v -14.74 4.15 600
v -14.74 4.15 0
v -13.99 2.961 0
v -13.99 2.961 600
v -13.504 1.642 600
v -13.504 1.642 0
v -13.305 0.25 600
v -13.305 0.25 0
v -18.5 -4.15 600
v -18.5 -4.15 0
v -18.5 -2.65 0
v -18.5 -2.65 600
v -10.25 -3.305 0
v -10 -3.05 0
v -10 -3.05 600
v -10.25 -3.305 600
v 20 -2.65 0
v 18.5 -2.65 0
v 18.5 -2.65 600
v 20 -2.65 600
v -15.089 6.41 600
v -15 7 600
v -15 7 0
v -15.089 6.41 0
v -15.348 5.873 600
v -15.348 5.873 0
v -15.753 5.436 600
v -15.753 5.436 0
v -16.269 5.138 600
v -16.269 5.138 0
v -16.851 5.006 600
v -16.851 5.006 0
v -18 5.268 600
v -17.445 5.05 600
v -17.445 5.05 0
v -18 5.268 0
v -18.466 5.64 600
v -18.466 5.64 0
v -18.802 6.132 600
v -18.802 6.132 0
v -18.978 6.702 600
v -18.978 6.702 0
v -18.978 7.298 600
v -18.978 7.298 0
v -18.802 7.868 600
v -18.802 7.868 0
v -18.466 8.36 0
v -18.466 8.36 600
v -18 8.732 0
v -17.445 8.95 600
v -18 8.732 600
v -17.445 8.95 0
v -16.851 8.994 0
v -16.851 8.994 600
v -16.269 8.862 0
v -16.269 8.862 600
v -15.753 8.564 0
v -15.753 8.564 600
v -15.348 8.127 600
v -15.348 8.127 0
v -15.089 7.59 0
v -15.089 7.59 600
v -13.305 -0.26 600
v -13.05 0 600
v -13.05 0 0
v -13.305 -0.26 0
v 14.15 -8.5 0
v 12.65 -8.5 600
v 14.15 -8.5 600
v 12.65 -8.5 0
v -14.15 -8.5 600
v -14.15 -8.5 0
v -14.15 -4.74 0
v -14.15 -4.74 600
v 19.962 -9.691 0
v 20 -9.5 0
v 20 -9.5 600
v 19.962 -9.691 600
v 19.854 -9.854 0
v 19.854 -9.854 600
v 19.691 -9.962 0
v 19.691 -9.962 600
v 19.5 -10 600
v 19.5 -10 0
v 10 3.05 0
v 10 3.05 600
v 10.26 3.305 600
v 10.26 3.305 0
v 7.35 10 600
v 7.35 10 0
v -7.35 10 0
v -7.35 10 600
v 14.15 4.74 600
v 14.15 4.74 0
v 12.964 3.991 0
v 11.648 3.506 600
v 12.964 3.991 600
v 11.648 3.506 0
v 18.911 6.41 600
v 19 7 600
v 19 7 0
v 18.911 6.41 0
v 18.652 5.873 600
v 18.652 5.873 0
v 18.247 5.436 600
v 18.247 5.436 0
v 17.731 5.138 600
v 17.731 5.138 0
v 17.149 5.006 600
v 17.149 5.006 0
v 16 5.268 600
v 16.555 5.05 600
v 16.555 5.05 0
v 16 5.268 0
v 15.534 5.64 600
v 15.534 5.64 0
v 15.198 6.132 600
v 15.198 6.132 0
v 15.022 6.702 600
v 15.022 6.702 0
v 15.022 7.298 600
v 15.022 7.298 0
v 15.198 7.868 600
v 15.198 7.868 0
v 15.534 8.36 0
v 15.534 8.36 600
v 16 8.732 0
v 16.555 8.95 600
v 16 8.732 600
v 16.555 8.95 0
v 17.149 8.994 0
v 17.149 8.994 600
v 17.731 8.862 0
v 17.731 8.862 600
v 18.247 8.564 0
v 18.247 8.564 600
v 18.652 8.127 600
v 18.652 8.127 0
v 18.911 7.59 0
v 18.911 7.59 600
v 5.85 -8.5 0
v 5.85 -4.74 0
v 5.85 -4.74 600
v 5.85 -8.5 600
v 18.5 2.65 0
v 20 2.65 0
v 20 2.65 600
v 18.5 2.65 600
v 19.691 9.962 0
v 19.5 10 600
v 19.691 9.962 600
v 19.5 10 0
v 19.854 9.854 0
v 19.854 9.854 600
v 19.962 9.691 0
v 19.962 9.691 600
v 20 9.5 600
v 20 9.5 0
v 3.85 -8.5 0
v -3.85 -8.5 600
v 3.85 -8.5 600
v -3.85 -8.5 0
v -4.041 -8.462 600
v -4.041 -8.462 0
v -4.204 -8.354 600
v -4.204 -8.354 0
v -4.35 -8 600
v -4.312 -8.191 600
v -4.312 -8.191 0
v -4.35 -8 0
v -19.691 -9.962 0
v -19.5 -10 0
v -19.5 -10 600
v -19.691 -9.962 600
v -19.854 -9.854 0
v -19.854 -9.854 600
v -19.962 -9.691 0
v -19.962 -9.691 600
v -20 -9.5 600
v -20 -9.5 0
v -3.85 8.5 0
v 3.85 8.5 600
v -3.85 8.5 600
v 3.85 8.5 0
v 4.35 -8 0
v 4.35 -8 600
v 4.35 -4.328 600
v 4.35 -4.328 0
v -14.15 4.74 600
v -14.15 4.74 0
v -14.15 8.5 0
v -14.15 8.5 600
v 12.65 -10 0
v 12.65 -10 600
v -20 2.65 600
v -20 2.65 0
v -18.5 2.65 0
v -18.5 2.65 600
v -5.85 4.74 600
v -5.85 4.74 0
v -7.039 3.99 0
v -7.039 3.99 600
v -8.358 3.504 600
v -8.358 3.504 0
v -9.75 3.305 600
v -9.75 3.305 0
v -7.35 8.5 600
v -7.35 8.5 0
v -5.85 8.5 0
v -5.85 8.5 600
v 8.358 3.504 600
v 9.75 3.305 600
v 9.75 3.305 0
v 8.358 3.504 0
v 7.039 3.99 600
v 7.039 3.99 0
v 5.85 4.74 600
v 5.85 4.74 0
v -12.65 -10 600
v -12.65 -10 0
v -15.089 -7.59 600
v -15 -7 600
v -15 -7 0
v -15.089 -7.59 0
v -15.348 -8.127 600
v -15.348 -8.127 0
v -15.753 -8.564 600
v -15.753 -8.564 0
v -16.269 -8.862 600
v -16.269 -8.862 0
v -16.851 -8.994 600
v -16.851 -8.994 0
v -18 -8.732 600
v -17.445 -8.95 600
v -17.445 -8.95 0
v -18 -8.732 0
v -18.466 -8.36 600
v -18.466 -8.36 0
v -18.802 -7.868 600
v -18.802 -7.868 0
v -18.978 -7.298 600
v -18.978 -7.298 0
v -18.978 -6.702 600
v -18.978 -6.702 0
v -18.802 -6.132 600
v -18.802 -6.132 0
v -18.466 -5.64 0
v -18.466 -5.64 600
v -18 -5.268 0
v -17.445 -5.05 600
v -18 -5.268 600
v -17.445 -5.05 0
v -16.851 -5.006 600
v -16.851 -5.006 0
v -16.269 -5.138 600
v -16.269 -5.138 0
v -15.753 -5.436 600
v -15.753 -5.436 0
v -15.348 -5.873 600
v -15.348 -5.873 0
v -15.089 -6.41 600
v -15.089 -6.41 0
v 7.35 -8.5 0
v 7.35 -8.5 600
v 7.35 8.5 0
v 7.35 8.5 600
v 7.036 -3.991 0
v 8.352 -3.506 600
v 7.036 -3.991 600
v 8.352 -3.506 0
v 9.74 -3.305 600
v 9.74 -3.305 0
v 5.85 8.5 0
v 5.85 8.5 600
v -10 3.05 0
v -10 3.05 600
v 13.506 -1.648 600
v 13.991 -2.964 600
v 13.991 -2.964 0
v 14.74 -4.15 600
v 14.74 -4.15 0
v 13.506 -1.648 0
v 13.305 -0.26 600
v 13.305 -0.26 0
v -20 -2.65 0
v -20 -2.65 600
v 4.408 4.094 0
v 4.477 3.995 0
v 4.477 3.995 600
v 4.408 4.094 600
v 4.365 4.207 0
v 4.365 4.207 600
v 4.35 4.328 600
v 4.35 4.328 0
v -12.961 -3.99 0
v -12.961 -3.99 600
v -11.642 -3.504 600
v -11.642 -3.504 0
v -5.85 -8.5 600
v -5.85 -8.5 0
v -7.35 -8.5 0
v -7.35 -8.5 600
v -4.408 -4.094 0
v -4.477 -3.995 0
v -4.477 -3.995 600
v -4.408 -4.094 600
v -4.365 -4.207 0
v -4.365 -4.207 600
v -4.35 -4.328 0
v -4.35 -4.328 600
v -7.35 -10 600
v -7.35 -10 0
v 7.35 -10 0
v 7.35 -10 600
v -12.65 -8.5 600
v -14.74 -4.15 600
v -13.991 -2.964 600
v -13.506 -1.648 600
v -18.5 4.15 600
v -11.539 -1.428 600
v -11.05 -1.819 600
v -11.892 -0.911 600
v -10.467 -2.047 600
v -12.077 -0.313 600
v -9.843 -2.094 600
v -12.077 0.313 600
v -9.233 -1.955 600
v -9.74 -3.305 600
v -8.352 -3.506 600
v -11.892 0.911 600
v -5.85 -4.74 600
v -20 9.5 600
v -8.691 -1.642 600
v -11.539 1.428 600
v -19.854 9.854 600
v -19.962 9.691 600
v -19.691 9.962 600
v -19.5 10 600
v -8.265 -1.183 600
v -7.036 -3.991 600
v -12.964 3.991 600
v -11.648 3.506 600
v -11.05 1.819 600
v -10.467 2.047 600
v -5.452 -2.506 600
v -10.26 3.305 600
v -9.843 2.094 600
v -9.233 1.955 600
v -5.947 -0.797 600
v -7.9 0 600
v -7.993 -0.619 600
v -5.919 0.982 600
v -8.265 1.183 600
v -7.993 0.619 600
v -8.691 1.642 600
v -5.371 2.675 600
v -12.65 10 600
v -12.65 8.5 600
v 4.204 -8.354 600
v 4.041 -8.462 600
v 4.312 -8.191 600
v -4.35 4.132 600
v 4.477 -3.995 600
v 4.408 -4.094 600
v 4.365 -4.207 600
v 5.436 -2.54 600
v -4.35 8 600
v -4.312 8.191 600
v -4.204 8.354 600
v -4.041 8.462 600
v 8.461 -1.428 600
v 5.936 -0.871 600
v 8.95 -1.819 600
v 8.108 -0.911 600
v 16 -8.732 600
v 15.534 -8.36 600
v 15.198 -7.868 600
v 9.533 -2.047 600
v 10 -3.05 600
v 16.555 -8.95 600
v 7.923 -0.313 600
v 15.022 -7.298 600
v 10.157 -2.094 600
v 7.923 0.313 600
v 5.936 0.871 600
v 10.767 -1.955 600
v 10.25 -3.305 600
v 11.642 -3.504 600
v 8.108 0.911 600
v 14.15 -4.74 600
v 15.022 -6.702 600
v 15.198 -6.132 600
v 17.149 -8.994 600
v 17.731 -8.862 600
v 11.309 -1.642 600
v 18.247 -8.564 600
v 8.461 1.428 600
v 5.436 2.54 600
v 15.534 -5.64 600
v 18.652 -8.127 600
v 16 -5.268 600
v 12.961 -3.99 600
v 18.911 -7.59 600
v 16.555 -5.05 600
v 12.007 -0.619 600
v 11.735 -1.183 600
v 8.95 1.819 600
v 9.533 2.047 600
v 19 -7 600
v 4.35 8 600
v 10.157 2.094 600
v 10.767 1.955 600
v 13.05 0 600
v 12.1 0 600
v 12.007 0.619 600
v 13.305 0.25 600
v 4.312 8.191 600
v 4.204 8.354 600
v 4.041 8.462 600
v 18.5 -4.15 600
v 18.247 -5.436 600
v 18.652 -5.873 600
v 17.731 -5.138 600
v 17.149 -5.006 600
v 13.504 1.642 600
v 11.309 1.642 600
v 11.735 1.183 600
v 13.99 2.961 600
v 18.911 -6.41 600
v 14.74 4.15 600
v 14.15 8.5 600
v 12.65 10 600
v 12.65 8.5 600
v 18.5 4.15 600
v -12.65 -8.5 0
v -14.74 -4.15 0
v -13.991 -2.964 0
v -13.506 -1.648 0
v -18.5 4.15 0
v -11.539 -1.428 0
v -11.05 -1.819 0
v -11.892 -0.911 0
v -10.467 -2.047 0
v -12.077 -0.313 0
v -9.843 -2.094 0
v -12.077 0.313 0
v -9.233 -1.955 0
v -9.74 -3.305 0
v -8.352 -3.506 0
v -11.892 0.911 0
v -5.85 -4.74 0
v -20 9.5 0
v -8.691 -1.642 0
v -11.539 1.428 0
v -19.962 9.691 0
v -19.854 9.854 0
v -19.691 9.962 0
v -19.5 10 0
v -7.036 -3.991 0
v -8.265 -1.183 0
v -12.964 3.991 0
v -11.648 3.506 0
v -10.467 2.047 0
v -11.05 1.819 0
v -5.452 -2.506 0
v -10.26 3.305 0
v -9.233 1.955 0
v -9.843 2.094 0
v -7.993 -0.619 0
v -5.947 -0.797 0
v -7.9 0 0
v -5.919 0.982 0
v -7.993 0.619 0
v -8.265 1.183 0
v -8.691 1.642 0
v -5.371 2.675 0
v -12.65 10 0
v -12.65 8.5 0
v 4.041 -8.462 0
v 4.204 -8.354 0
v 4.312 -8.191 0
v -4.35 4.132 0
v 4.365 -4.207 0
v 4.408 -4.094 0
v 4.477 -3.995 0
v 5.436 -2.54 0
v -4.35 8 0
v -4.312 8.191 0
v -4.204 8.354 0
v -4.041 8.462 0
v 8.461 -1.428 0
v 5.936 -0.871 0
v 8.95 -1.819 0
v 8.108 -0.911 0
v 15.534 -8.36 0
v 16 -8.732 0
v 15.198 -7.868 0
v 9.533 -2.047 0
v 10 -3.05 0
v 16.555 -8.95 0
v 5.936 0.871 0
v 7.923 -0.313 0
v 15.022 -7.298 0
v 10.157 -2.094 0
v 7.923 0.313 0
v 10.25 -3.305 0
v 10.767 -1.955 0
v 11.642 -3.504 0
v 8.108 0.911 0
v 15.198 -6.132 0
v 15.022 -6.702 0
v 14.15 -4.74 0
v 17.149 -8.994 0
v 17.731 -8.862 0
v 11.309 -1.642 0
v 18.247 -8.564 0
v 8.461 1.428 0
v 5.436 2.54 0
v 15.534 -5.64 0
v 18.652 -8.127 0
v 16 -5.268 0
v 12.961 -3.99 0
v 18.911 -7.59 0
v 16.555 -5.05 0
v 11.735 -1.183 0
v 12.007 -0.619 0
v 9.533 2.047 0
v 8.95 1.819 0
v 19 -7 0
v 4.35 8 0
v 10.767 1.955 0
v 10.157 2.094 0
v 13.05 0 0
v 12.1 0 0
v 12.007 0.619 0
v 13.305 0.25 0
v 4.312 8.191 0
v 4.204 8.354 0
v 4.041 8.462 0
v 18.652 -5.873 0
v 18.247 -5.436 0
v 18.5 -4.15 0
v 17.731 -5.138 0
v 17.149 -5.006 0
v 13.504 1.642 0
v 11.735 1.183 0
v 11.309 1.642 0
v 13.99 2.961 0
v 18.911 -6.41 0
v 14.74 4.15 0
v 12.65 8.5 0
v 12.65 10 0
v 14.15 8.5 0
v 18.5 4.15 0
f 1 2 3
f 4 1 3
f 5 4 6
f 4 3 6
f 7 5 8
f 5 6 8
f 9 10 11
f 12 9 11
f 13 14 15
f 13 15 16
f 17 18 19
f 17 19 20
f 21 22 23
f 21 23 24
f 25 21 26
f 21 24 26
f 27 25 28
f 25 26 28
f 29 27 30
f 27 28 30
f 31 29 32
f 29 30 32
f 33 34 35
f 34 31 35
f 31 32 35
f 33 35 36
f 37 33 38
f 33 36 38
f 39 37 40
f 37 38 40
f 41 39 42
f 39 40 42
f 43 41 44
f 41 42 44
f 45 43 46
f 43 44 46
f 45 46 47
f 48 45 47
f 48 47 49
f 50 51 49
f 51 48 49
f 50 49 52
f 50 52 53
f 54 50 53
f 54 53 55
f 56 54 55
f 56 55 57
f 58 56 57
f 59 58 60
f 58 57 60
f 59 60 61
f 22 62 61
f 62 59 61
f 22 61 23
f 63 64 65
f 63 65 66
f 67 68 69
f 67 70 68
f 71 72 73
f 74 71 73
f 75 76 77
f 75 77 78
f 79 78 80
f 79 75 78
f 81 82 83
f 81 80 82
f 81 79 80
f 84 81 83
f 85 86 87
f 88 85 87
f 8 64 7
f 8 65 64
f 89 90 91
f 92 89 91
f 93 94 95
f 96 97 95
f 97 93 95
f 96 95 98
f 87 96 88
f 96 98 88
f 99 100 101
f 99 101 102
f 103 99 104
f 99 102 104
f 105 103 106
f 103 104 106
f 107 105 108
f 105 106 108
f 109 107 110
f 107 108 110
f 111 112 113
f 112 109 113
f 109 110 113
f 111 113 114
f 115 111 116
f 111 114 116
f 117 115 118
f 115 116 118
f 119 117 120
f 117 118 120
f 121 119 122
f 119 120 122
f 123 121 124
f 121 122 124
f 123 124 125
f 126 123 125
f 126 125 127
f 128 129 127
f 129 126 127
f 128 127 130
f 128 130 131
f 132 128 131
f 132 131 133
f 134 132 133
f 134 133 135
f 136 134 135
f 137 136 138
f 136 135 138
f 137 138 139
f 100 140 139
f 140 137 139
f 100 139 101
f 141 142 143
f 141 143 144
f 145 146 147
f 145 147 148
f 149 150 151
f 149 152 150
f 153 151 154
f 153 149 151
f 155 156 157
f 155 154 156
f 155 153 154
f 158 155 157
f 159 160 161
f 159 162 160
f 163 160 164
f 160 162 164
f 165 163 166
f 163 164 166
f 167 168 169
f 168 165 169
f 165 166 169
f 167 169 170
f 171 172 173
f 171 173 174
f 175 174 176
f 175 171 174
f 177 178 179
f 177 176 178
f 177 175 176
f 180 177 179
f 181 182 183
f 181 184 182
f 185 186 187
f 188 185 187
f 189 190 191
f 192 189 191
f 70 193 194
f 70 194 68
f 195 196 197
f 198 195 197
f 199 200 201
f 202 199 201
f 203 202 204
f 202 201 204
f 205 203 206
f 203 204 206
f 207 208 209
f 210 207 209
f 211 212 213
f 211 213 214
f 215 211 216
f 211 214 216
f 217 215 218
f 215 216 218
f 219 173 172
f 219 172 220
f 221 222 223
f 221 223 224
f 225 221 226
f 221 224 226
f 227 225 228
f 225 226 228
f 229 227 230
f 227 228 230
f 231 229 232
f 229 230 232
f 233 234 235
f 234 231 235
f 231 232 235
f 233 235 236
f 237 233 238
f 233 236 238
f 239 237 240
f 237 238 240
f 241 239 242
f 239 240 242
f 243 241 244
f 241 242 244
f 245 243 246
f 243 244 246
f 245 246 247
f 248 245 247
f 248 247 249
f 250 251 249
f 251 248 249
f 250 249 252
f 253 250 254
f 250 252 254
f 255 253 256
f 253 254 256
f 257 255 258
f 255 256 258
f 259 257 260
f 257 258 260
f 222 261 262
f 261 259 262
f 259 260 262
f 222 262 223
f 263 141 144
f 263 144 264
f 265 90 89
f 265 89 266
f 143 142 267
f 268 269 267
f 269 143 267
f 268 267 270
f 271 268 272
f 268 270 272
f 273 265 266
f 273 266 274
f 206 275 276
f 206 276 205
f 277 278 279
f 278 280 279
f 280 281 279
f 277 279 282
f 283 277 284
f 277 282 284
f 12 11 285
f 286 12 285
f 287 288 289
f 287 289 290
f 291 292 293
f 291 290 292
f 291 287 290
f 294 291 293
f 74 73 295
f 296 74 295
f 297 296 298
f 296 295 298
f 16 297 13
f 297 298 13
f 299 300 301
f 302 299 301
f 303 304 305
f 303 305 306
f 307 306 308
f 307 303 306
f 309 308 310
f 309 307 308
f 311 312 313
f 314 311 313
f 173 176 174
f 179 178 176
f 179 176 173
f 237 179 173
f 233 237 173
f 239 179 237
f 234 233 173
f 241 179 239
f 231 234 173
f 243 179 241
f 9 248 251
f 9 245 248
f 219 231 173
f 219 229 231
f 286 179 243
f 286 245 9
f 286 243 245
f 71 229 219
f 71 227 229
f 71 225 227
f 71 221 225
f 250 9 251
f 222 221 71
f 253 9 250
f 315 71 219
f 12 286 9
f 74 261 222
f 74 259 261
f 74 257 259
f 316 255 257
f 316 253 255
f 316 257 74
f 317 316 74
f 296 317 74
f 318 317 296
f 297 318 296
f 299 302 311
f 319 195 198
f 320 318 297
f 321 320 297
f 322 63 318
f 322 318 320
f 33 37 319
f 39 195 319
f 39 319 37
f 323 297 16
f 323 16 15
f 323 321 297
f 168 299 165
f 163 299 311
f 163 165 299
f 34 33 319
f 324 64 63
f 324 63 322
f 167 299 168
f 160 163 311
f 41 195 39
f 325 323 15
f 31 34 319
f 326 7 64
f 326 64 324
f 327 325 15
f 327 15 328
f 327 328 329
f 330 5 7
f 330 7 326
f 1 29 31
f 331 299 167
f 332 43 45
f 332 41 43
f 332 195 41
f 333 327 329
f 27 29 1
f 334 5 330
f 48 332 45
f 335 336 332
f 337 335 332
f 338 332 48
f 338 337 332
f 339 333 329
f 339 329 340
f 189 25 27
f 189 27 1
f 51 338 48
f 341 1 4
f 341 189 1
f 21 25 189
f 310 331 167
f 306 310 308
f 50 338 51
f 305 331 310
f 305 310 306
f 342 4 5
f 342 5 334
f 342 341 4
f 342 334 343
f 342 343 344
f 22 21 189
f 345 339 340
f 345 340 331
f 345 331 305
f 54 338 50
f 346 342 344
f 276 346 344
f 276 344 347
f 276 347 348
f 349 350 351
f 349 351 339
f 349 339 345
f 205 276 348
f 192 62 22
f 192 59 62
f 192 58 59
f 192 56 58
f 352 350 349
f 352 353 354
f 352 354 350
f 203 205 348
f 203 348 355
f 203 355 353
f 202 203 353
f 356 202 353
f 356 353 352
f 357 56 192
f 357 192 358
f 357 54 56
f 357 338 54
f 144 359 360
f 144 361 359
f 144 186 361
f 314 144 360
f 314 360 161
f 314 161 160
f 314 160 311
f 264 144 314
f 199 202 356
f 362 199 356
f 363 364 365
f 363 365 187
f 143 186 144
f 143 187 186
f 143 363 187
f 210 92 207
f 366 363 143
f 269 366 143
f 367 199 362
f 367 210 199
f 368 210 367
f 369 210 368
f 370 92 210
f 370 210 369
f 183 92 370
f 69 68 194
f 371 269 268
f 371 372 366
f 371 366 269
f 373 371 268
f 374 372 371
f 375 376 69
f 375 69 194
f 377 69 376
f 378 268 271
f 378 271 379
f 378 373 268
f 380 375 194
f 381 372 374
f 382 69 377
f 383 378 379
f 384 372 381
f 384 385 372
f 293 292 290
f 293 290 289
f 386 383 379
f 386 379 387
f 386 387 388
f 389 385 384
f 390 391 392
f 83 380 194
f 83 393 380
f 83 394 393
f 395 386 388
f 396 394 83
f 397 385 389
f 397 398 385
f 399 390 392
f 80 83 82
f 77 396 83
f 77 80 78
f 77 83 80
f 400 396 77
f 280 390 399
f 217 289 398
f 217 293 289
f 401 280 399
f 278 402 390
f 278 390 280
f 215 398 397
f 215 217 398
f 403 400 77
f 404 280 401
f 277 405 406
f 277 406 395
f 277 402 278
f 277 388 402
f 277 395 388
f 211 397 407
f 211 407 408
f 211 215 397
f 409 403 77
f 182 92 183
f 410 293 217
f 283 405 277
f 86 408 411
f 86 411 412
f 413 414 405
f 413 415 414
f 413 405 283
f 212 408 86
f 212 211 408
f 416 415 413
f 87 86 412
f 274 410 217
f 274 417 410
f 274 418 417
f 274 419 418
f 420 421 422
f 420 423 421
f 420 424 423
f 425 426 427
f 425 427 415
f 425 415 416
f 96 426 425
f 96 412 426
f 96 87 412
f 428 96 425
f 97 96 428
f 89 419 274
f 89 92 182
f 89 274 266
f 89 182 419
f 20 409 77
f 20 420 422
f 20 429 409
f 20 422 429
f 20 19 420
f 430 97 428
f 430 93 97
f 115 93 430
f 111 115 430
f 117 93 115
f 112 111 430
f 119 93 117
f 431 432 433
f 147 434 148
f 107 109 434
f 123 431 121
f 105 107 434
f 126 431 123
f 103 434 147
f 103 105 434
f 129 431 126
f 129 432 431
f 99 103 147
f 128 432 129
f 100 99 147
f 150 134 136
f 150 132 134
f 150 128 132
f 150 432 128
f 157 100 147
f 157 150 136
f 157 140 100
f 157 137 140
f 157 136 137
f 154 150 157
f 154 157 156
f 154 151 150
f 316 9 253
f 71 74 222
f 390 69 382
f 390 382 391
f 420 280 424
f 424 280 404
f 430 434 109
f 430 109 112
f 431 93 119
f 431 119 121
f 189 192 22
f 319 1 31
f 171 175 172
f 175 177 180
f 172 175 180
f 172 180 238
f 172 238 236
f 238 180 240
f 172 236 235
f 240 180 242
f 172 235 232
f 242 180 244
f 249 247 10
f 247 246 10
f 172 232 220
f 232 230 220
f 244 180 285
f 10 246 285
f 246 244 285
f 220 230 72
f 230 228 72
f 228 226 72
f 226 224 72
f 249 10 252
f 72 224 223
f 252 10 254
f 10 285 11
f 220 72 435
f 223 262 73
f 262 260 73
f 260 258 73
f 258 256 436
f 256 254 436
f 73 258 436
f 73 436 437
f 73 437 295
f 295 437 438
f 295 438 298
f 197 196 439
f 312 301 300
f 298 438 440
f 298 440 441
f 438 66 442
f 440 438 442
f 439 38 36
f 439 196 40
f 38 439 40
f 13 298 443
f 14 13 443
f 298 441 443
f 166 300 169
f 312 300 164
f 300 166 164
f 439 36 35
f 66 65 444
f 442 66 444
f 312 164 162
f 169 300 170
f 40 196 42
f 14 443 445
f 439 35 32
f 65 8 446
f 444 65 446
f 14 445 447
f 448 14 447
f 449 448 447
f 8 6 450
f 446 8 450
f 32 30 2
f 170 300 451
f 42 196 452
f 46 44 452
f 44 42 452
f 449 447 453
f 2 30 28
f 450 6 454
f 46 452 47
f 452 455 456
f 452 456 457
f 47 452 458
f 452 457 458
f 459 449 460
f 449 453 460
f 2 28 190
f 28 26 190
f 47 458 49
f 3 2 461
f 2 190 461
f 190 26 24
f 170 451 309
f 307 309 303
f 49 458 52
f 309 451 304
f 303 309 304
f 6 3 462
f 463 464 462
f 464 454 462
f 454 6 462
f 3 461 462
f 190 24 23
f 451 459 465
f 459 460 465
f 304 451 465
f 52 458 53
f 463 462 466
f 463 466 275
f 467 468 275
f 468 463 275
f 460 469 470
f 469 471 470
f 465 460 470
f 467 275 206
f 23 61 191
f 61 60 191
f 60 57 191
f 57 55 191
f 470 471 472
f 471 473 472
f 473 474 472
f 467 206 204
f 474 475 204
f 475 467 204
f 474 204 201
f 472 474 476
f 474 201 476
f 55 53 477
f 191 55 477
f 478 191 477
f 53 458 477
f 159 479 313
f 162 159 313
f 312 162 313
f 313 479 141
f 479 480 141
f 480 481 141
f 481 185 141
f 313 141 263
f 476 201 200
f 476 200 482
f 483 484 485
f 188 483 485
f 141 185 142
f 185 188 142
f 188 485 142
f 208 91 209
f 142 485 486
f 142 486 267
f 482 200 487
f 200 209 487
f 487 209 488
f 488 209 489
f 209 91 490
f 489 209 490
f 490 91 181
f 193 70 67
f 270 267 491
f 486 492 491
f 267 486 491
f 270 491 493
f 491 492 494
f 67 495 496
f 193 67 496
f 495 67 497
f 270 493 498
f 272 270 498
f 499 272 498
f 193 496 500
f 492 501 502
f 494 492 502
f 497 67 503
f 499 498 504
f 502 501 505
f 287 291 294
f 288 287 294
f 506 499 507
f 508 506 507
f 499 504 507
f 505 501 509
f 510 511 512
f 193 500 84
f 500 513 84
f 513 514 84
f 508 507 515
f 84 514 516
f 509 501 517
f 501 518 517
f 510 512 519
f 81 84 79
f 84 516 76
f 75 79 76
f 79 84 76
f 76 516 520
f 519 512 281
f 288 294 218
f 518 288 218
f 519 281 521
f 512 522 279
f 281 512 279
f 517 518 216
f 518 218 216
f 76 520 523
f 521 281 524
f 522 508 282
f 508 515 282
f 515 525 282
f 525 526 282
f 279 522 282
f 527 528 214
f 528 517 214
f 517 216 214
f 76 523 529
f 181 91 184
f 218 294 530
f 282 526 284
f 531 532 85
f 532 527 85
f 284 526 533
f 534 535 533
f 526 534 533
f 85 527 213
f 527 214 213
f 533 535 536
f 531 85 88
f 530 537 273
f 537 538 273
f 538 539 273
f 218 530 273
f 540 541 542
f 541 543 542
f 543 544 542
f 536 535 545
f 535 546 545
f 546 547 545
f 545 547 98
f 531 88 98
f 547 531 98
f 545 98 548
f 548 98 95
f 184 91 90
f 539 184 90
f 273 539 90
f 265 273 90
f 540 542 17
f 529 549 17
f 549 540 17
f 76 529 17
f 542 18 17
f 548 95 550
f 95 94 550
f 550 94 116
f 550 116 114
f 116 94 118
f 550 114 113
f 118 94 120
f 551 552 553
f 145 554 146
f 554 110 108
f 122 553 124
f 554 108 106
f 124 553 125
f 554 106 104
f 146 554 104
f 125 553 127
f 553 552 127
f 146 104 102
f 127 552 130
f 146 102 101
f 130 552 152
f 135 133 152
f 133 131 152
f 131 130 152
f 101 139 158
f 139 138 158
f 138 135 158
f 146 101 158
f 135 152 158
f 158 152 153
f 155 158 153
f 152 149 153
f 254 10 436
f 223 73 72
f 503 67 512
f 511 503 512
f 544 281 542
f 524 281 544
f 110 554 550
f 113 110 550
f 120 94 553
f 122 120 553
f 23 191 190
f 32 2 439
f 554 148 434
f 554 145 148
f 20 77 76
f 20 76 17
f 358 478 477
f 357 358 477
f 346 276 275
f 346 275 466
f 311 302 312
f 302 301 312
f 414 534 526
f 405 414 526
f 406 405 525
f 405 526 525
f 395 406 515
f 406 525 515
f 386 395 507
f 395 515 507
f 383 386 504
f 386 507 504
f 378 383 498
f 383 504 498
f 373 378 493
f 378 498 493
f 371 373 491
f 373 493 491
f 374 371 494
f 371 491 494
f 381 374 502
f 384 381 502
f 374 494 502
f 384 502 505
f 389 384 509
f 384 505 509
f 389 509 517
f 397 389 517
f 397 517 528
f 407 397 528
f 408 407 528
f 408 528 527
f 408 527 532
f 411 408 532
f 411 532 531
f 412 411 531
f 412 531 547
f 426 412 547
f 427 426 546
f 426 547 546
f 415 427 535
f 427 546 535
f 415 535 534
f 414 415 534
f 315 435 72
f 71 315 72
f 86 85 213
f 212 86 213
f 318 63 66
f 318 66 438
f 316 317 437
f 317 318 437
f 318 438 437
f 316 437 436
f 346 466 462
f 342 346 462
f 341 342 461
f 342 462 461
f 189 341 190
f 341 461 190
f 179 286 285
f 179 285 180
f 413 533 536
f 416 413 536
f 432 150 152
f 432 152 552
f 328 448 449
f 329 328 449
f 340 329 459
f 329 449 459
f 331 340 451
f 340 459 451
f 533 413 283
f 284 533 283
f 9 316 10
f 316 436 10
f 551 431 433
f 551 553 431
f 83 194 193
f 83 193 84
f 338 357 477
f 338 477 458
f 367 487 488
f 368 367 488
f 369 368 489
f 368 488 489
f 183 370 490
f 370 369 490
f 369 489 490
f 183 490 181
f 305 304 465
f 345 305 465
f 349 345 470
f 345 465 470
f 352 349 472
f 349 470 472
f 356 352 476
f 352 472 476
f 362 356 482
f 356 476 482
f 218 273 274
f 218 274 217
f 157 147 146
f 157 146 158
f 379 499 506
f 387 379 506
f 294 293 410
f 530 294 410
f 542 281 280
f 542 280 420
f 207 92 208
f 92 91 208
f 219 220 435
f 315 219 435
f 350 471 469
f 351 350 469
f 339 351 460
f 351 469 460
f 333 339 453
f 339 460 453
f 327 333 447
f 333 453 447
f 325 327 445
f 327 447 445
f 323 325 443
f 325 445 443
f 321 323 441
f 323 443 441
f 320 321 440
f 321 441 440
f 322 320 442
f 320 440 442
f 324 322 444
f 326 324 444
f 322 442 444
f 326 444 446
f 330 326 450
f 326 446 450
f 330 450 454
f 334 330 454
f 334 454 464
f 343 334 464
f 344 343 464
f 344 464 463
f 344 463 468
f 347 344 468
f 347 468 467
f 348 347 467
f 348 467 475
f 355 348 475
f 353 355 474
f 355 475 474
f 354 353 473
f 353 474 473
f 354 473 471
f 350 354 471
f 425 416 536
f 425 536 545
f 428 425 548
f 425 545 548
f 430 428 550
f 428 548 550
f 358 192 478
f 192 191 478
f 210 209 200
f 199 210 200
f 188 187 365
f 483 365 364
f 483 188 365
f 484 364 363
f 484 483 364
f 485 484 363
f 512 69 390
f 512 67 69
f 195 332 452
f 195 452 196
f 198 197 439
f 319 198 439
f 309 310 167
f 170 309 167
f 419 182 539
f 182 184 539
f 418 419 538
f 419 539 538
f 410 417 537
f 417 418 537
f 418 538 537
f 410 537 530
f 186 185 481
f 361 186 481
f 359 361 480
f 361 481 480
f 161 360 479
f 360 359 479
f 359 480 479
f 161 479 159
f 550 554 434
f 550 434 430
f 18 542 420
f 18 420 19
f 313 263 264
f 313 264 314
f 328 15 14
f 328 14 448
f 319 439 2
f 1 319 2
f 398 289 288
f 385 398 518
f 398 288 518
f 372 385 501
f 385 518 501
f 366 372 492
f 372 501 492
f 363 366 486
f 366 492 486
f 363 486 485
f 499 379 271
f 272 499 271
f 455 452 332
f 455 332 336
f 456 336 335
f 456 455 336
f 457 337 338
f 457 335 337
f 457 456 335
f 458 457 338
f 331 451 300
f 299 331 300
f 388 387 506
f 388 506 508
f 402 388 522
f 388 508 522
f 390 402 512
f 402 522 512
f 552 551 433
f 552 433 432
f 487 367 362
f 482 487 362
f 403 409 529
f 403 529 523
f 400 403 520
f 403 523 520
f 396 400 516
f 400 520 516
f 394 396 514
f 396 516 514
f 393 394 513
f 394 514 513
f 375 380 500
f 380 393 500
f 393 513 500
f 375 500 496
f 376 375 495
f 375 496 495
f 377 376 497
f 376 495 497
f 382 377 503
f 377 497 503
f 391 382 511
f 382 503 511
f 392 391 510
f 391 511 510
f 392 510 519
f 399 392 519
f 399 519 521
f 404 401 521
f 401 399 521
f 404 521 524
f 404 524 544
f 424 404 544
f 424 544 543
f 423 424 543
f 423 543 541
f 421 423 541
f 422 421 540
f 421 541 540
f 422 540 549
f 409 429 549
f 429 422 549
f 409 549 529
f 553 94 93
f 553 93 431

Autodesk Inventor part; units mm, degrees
ref_plane "YZ Plane" through (0, 0, 0) normal (1, 0, 0) x (0, 1, 0)
ref_plane "XZ Plane" through (0, 0, 0) normal (0, 1, 0) x (-1, 0, 0)
ref_plane "XY Plane" through (0, 0, 0) normal (0, 0, 1) x (1, 0, 0)
sketch "스케치1" plane through (0, 0, 0) normal (0, 0, 1) x (1, 0, 0)
  line L0 (-19.5, -10) -> (19.5, -10)
  line L1 (20, -9.5) -> (20, 9.5)
  line L2 (19.5, 10) -> (-19.5, 10)
  line L3 (-20, 9.5) -> (-20, -9.5)
  circle A0 centre (-17, 7) radius 2
  line L4 (0, -12.143) -> (0, 11.1651)
  line L5 (28.9925, 0) -> (-24.8769, 0)
  circle A1 centre (-10, 0) radius 2.1
  line L6 (-10, 12.7543) -> (-10, -12.5913)
  line L7 (10, -12.5913) -> (10, 12.7543)
  circle A2 centre (10, 0) radius 2.1
  line L8 (-12.65, -10) -> (-12.65, -8.5)
  line L9 (-12.65, -8.5) -> (-14.15, -8.5)
  line L10 (-14.15, -8.5) -> (-14.15, -4.7403)
  line L11 (-5.85, -4.7397) -> (-5.85, -8.5)
  line L12 (-5.85, -8.5) -> (-7.35, -8.5)
  line L13 (-7.35, -8.5) -> (-7.35, -10)
  arc A3 (-5.85, -4.7397) -> (-14.15, -4.7403) centre (-9.9996, -10) ccw
  line L14 (-10, -3.05) -> (-10.25, -3.3047)
  line L15 (-10, -3.05) -> (-9.7398, -3.305)
  line L16 (12.65, -10) -> (12.65, -8.5)
  line L17 (12.65, -8.5) -> (14.15, -8.5)
  line L18 (14.15, -8.5) -> (14.15, -4.7403)
  line L19 (5.85, -4.7397) -> (5.85, -8.5)
  line L20 (5.85, -8.5) -> (7.35, -8.5)
  line L21 (7.35, -8.5) -> (7.35, -10)
  arc A4 (14.15, -4.7403) -> (5.85, -4.7397) centre (9.9996, -10) ccw
  line L22 (10, -3.05) -> (10.25, -3.3047)
  line L23 (10, -3.05) -> (9.7398, -3.305)
  line L24 (-20, 2.65) -> (-18.5, 2.65)
  line L25 (-18.5, 2.65) -> (-18.5, 4.15)
  line L26 (-18.5, 4.15) -> (-14.7403, 4.15)
  line L27 (-14.7397, -4.15) -> (-18.5, -4.15)
  line L28 (-18.5, -4.15) -> (-18.5, -2.65)
  line L29 (-18.5, -2.65) -> (-20, -2.65)
  line L30 (-13.05, 0) -> (-13.305, -0.2602)
  line L31 (-13.05, 0) -> (-13.3047, 0.25)
  arc A5 (-14.7397, -4.15) -> (-14.7403, 4.15) centre (-20, -0.0004) ccw
  line L32 (-7.35, 10) -> (-7.35, 8.5)
  line L33 (-7.35, 8.5) -> (-5.85, 8.5)
  line L34 (-5.85, 8.5) -> (-5.85, 4.7403)
  line L35 (-14.15, 4.7397) -> (-14.15, 8.5)
  line L36 (-14.15, 8.5) -> (-12.65, 8.5)
  line L37 (-12.65, 8.5) -> (-12.65, 10)
  line L38 (-10, 3.05) -> (-10.2602, 3.305)
  line L39 (-10, 3.05) -> (-9.75, 3.3047)
  arc A6 (-14.15, 4.7397) -> (-5.85, 4.7403) centre (-10.0004, 10) ccw
  line L40 (14.7397, -4.15) -> (18.5, -4.15)
  line L41 (18.5, -4.15) -> (18.5, -2.65)
  line L42 (18.5, -2.65) -> (20, -2.65)
  arc A7 (14.7403, 4.15) -> (14.7397, -4.15) centre (20, -0.0004) ccw
  line L43 (20, 2.65) -> (18.5, 2.65)
  line L44 (18.5, 2.65) -> (18.5, 4.15)
  line L45 (18.5, 4.15) -> (14.7403, 4.15)
  line L46 (13.05, 0) -> (13.305, -0.2602)
  line L47 (13.05, 0) -> (13.3047, 0.25)
  line L48 (14.15, 4.7397) -> (14.15, 8.5)
  line L49 (14.15, 8.5) -> (12.65, 8.5)
  line L50 (12.65, 8.5) -> (12.65, 10)
  arc A8 (5.85, 4.7403) -> (14.15, 4.7397) centre (10.0004, 10) ccw
  line L51 (7.35, 10) -> (7.35, 8.5)
  line L52 (7.35, 8.5) -> (5.85, 8.5)
  line L53 (5.85, 8.5) -> (5.85, 4.7403)
  line L54 (10, 3.05) -> (10.2602, 3.305)
  line L55 (10, 3.05) -> (9.75, 3.3047)
  circle A9 centre (-17, -7) radius 2
  circle A10 centre (17, 7) radius 2
  circle A11 centre (17, -7) radius 2
  line L56 (-3.85, -8.5) -> (3.85, -8.5)
  line L57 (3.85, 8.5) -> (-3.85, 8.5)
  line L58 (-4.35, -8.5) -> (4.35, 8.5) construction
  line L59 (4.35, -8.5) -> (-4.35, 8.5) construction
  arc A12 (-3.85, 8.5) -> (-4.35, 8) centre (-3.85, 8) ccw
  arc A13 (4.35, 8) -> (3.85, 8.5) centre (3.85, 8) ccw
  arc A14 (3.85, -8.5) -> (4.35, -8) centre (3.85, -8) ccw
  arc A15 (-4.35, -8) -> (-3.85, -8.5) centre (-3.85, -8) ccw
  line L60 (-4.35, 8) -> (-4.35, 4.1325)
  line L61 (-4.35, -4.3275) -> (-4.35, -8)
  line L62 (4.35, -8) -> (4.35, -4.3275)
  line L63 (4.35, 4.3275) -> (4.35, 8)
  arc A16 (4.4769, -3.9946) -> (4.4769, 3.9946) centre (0, 0) ccw
  arc A17 (-4.35, 4.1325) -> (-4.4769, -3.9946) centre (0, 0) ccw
  arc A18 (-4.35, -4.3275) -> (-4.4769, -3.9946) centre (-4.85, -4.3275) ccw
  arc A19 (4.35, 4.3275) -> (4.4769, 3.9946) centre (4.85, 4.3275) ccw
  arc A20 (4.4769, -3.9946) -> (4.35, -4.3275) centre (4.85, -4.3275) ccw
  arc A21 (-19.5, 10) -> (-20, 9.5) centre (-19.5, 9.5) ccw
  arc A22 (-20, -9.5) -> (-19.5, -10) centre (-19.5, -9.5) ccw
  arc A23 (19.5, -10) -> (20, -9.5) centre (19.5, -9.5) ccw
  arc A24 (20, 9.5) -> (19.5, 10) centre (19.5, 9.5) ccw
  point P0 (20, 10)
  point P1 (20, -10)
  point P2 (-20, 10)
  point P3 (-14.15, -6.6202)
  point P4 (-12.65, -9.25)
  point P5 (-10.0001, -3.3)
  point P6 (14.15, -6.6202)
  point P7 (12.65, -9.25)
  point P8 (10.0001, -3.3)
  point P9 (-19.25, 2.65)
  point P10 (-16.6202, 4.15)
  point P11 (-13.3, 0.0001)
  point P12 (-7.35, 9.25)
  point P13 (-5.85, 6.6202)
  point P14 (-9.9999, 3.3)
  point P15 (13.3, 0.0001)
  point P16 (19.25, 2.65)
  point P17 (16.6202, 4.15)
  point P18 (22.5913, 0)
  point P19 (9.9999, 3.3)
  point P20 (7.35, 9.25)
  point P21 (5.85, 6.6202)
  point P22 (10, 12.5913)
  point P23 (-5.85, -6.6199)
  point P24 (-4.35, -4.1325)
  point P25 (4.35, -4.1325)
  point P26 (4.35, 4.1325)
  point P27 (4.35, 6.1638)
  point P28 (-4.35, 6.0662)
  dimension "d0" = 40
  dimension "d1" = 20
  dimension "d2" = 4
  dimension "d3" = 34
  dimension "d4" = 14
  dimension "d5" = 4.2
  dimension "d6" = 20
  dimension "d8" = 4.2
  dimension "d9" = 20
  dimension "d12" = 1.5
  dimension "d13" = 6.7
  dimension "d14" = 8.3
  dimension "d15" = 5.3
  dimension "d16" = 5.3
  dimension "d17" = 8.3
  dimension "d18" = 6.7
  dimension "d19" = 0.5
  dimension "d20" = 0.25
  dimension "d23" = 180
  dimension "d27" = 180
  dimension "d29" = 1.5
  dimension "d31" = 1.5
  dimension "d32" = 0.5
  dimension "d33" = 0.5
  dimension "d34" = 0.5
  dimension "d35" = 8.7
extrude "돌출1" add sketch "스케치1" along normal blind 600 contours A22 L3 L29 L28 L27 A5 L30 L5 A1 L6 L14 A3 L10 L9 L8 L0 | L13 L12 L11 A3 L15 L6 A1 L5 A17 A18 L61 A15 L56 L4 L0 | L4 L56 A14 L62 A20 A16 L5 A2 L7 L23 A4 L19 L20 L21 L0 | L3 A21 L2 L37 L36 L35 A6 L38 L6 A1 L5 L31 A5 L26 L25 L24 | A1 L6 L39 A6 L34 L33 L32 L2 L4 L57 A12 L60 A17 L5 | L16 L17 L18 A4 L22 L7 A2 L5 L46 A7 L40 L41 L42 L1 A23 L0 | L4 L2 L51 L52 L53 A8 L55 L7 A2 L5 A16 A19 L63 A13 L57 | L7 L54 A8 L48 L49 L50 L2 A24 L1 L43 L44 L45 A7 L47 L5 A2
equation "\"d8\" = d5"
properties part number "20x40 profile"
